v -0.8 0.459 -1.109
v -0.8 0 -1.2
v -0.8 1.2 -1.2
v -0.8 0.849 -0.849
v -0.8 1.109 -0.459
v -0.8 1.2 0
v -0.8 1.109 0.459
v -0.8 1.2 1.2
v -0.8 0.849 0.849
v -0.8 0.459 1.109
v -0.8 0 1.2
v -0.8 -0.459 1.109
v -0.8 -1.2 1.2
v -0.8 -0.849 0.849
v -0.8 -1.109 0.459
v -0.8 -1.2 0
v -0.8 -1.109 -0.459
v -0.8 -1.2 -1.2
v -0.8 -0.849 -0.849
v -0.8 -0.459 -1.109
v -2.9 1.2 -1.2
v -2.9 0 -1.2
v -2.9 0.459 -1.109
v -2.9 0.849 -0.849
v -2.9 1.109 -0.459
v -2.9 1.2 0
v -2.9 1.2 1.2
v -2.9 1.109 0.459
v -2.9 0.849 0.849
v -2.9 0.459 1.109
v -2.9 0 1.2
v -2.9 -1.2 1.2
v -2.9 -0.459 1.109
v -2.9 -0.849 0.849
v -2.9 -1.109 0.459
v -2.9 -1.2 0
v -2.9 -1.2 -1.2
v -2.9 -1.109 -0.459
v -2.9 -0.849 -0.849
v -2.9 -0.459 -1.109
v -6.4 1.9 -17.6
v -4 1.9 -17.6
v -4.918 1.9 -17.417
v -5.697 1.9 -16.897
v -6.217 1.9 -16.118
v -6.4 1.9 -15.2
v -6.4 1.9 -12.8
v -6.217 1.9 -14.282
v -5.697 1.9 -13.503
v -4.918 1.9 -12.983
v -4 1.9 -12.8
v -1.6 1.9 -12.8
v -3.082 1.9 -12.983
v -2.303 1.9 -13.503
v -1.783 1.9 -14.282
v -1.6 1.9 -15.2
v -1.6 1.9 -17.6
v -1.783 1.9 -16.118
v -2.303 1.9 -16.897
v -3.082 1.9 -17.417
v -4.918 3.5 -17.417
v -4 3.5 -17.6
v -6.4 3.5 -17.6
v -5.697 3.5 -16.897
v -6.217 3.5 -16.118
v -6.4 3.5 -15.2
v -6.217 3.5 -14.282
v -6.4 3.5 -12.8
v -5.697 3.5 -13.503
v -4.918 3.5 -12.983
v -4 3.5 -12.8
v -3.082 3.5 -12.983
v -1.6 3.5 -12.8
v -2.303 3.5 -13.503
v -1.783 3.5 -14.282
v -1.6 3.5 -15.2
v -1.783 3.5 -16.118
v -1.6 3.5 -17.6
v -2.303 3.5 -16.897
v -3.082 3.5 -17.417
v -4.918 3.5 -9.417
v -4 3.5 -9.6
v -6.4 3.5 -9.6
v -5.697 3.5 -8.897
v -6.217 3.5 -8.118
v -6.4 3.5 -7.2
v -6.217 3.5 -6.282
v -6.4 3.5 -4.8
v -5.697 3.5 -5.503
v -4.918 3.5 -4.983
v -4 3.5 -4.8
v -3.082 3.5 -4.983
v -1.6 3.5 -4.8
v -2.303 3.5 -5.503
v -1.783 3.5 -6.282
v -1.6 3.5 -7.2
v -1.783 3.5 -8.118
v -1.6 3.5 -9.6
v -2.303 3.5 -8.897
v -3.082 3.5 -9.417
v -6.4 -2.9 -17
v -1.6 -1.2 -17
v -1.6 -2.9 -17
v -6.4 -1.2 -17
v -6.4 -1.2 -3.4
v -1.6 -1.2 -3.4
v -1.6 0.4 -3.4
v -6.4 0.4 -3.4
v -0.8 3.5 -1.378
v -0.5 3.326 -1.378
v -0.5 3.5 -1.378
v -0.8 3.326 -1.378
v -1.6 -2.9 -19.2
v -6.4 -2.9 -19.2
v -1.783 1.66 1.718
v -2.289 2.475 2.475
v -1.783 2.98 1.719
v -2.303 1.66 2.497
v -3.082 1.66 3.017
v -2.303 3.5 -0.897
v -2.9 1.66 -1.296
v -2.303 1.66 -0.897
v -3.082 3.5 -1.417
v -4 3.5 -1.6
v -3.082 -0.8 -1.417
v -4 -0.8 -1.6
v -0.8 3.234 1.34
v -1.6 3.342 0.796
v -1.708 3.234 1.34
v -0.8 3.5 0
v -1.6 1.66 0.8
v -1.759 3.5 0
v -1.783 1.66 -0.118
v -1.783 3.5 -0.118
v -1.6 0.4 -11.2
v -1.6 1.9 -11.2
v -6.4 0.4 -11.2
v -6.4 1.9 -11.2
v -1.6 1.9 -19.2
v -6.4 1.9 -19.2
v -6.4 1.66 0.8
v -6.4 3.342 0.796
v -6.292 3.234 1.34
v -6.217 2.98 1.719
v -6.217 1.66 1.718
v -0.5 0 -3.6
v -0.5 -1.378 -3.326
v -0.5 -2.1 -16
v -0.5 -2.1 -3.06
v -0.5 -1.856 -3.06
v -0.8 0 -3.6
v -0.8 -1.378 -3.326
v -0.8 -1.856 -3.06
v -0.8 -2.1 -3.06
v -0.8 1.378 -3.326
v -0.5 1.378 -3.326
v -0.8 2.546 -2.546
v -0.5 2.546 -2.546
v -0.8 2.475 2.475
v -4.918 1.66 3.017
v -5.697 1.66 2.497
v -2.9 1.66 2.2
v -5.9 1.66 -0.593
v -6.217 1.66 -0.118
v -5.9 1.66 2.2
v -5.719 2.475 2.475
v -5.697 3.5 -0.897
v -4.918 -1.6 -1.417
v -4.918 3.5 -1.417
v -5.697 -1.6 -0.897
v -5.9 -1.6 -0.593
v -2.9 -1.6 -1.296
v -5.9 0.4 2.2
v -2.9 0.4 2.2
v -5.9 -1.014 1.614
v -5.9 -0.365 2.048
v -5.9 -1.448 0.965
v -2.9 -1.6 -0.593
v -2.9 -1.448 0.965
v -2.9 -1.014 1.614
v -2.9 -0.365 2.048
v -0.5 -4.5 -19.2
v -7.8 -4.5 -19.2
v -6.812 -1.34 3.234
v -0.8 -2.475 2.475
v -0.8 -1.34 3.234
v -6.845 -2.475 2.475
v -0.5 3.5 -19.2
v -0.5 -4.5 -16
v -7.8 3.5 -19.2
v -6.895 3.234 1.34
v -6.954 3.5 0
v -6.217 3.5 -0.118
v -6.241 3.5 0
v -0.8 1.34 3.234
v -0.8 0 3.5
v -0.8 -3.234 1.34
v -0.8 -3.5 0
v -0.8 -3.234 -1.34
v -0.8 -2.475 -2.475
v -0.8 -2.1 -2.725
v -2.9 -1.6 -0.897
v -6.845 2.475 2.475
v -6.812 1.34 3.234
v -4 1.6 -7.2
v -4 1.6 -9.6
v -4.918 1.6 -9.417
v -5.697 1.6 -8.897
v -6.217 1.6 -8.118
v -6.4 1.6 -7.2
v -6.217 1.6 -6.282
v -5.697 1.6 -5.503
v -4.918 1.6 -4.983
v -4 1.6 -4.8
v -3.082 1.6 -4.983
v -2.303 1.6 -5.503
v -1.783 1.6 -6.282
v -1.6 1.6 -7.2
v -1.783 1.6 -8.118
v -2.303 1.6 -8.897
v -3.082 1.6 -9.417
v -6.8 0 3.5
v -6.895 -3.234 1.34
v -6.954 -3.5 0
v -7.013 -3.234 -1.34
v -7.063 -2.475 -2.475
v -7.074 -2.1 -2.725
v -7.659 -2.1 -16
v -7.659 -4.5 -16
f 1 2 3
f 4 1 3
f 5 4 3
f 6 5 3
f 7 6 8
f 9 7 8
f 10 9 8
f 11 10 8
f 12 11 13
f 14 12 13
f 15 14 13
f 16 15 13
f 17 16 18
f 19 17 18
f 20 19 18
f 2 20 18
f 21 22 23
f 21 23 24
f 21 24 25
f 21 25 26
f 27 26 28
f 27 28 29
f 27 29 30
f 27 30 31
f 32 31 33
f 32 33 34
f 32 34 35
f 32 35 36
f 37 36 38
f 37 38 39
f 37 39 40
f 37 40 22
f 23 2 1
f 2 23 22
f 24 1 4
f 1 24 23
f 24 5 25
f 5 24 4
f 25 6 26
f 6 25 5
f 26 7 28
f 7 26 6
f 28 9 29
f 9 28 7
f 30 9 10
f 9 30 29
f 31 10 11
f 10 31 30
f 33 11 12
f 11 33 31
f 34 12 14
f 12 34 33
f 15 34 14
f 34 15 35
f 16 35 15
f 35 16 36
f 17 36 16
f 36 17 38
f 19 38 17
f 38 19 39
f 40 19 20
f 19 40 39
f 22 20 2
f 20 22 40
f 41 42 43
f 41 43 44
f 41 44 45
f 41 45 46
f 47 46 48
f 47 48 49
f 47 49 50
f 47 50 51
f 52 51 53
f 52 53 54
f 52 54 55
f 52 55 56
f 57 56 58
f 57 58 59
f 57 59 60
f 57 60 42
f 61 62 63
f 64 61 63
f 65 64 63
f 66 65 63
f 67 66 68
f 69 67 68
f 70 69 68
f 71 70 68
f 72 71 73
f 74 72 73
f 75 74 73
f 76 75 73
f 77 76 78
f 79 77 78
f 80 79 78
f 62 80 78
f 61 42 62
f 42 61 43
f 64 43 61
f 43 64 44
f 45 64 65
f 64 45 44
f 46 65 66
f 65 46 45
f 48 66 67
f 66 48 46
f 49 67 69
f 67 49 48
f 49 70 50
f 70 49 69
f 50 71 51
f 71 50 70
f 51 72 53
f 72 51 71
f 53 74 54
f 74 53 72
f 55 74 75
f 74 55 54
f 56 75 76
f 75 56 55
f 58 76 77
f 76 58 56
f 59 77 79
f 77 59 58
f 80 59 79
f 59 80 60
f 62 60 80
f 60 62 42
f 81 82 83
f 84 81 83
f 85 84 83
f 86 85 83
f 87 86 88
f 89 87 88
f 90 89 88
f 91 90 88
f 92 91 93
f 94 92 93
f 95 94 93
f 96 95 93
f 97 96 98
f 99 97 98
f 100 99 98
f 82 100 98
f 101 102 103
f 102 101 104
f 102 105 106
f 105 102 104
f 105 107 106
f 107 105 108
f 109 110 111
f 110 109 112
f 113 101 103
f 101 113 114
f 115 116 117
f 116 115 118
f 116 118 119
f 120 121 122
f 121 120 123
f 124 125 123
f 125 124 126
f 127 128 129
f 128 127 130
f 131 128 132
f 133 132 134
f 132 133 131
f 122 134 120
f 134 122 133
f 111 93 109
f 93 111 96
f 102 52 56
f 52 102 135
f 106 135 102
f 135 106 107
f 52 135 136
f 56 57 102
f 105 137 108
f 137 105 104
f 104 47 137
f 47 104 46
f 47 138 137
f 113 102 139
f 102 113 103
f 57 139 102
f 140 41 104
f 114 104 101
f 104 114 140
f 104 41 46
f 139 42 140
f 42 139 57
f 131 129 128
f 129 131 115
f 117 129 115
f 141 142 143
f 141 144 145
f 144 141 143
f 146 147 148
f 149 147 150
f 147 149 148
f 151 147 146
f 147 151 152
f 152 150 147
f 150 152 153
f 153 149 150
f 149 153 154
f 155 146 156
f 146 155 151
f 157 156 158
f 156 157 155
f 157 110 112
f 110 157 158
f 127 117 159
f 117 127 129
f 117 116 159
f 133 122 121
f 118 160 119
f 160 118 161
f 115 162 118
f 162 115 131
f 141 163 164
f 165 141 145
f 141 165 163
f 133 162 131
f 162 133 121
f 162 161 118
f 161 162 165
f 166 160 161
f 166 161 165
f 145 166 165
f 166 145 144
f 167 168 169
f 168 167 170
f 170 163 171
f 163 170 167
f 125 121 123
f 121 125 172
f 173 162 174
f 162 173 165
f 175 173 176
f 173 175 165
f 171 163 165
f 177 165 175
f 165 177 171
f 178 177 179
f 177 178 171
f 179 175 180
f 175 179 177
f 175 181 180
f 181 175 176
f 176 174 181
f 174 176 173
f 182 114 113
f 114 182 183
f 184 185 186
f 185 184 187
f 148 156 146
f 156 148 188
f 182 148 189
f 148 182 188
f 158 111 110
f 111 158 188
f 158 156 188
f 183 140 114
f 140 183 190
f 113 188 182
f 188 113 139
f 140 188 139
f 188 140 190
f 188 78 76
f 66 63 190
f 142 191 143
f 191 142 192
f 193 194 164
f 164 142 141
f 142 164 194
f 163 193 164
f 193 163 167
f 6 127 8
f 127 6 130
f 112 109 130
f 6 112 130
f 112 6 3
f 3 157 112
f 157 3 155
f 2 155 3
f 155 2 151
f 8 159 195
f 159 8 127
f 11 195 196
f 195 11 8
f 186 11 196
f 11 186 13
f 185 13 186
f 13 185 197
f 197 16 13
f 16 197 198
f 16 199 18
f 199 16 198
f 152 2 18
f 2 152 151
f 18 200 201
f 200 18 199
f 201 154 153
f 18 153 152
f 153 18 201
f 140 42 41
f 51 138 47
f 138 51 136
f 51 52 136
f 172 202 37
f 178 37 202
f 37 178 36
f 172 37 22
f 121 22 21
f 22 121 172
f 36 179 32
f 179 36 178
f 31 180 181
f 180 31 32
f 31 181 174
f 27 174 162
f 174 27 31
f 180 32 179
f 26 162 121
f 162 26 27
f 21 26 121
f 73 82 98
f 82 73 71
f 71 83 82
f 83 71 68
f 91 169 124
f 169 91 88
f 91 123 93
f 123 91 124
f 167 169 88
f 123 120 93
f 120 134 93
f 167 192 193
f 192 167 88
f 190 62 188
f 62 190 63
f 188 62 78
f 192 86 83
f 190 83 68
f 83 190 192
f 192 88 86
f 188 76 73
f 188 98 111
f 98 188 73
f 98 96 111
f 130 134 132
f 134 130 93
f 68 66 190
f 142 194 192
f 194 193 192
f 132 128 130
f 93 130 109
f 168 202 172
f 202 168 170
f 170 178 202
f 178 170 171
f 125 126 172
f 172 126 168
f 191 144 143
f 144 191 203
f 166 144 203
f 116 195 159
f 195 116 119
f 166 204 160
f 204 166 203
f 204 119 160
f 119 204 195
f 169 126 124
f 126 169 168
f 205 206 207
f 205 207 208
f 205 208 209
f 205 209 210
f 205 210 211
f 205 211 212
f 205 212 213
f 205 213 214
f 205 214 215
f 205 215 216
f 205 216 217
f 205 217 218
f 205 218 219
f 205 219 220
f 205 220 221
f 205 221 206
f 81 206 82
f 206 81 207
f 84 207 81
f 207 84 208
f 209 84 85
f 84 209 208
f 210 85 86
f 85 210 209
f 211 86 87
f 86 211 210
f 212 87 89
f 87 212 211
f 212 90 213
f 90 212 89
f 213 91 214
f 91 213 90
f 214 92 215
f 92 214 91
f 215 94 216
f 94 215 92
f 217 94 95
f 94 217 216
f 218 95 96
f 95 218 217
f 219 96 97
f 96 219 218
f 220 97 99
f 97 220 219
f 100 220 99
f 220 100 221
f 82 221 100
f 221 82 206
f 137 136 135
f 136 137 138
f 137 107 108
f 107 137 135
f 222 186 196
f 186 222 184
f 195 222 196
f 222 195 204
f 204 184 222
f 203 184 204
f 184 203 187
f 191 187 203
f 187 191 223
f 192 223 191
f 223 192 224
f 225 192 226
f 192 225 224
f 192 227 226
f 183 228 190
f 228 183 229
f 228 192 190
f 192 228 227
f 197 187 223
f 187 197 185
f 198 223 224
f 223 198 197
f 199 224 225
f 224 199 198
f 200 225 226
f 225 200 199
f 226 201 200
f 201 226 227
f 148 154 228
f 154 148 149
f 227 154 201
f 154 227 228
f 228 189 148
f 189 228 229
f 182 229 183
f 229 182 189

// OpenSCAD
use <../lib.scad>
use <87775.scad>
function ldraw_lib__87776() = [
// 0 Minifig Leg Right Long with Closed Hole
// 0 Name: 87776.dat
// 0 Author: Magnus Forsberg [MagFors]
// 0 !LDRAW_ORG Part UPDATE 2023-03
// 0 !LICENSE Licensed under CC BY 4.0 : see CAreadme.txt
// 
// 0 !HELP Move down 12 units to align with hips
// 0 !HELP Move at z=1.25 relative to stud grid
// 
// 0 BFC CERTIFY CCW
  [0,"BFC","CERTIFY"],
  [0,"BFC","CCW"],
// 
// 0 !KEYWORDS Jessie, Toy Story, Woody
// 
// 0 !HISTORY 2023-06-24 [OrionP] Official Update 2023-03
// 
// 
// 1 16 0 0 0 -1 0 0 0 1 0 0 0 1 87775.dat
  [1,16,0,0,0,-1,0,0,0,1,0,0,0,1, ldraw_lib__87775()],
];
module ldraw_lib__87776(step=0, col=false, unit=2/5, alt=false, line=0.2, solid=!$preview)
    makepoly(ldraw_lib__87776(), step=step, col=col, unit=unit, alt=alt, line=line, solid=solid);
ldraw_lib__87776(line=0.2);
